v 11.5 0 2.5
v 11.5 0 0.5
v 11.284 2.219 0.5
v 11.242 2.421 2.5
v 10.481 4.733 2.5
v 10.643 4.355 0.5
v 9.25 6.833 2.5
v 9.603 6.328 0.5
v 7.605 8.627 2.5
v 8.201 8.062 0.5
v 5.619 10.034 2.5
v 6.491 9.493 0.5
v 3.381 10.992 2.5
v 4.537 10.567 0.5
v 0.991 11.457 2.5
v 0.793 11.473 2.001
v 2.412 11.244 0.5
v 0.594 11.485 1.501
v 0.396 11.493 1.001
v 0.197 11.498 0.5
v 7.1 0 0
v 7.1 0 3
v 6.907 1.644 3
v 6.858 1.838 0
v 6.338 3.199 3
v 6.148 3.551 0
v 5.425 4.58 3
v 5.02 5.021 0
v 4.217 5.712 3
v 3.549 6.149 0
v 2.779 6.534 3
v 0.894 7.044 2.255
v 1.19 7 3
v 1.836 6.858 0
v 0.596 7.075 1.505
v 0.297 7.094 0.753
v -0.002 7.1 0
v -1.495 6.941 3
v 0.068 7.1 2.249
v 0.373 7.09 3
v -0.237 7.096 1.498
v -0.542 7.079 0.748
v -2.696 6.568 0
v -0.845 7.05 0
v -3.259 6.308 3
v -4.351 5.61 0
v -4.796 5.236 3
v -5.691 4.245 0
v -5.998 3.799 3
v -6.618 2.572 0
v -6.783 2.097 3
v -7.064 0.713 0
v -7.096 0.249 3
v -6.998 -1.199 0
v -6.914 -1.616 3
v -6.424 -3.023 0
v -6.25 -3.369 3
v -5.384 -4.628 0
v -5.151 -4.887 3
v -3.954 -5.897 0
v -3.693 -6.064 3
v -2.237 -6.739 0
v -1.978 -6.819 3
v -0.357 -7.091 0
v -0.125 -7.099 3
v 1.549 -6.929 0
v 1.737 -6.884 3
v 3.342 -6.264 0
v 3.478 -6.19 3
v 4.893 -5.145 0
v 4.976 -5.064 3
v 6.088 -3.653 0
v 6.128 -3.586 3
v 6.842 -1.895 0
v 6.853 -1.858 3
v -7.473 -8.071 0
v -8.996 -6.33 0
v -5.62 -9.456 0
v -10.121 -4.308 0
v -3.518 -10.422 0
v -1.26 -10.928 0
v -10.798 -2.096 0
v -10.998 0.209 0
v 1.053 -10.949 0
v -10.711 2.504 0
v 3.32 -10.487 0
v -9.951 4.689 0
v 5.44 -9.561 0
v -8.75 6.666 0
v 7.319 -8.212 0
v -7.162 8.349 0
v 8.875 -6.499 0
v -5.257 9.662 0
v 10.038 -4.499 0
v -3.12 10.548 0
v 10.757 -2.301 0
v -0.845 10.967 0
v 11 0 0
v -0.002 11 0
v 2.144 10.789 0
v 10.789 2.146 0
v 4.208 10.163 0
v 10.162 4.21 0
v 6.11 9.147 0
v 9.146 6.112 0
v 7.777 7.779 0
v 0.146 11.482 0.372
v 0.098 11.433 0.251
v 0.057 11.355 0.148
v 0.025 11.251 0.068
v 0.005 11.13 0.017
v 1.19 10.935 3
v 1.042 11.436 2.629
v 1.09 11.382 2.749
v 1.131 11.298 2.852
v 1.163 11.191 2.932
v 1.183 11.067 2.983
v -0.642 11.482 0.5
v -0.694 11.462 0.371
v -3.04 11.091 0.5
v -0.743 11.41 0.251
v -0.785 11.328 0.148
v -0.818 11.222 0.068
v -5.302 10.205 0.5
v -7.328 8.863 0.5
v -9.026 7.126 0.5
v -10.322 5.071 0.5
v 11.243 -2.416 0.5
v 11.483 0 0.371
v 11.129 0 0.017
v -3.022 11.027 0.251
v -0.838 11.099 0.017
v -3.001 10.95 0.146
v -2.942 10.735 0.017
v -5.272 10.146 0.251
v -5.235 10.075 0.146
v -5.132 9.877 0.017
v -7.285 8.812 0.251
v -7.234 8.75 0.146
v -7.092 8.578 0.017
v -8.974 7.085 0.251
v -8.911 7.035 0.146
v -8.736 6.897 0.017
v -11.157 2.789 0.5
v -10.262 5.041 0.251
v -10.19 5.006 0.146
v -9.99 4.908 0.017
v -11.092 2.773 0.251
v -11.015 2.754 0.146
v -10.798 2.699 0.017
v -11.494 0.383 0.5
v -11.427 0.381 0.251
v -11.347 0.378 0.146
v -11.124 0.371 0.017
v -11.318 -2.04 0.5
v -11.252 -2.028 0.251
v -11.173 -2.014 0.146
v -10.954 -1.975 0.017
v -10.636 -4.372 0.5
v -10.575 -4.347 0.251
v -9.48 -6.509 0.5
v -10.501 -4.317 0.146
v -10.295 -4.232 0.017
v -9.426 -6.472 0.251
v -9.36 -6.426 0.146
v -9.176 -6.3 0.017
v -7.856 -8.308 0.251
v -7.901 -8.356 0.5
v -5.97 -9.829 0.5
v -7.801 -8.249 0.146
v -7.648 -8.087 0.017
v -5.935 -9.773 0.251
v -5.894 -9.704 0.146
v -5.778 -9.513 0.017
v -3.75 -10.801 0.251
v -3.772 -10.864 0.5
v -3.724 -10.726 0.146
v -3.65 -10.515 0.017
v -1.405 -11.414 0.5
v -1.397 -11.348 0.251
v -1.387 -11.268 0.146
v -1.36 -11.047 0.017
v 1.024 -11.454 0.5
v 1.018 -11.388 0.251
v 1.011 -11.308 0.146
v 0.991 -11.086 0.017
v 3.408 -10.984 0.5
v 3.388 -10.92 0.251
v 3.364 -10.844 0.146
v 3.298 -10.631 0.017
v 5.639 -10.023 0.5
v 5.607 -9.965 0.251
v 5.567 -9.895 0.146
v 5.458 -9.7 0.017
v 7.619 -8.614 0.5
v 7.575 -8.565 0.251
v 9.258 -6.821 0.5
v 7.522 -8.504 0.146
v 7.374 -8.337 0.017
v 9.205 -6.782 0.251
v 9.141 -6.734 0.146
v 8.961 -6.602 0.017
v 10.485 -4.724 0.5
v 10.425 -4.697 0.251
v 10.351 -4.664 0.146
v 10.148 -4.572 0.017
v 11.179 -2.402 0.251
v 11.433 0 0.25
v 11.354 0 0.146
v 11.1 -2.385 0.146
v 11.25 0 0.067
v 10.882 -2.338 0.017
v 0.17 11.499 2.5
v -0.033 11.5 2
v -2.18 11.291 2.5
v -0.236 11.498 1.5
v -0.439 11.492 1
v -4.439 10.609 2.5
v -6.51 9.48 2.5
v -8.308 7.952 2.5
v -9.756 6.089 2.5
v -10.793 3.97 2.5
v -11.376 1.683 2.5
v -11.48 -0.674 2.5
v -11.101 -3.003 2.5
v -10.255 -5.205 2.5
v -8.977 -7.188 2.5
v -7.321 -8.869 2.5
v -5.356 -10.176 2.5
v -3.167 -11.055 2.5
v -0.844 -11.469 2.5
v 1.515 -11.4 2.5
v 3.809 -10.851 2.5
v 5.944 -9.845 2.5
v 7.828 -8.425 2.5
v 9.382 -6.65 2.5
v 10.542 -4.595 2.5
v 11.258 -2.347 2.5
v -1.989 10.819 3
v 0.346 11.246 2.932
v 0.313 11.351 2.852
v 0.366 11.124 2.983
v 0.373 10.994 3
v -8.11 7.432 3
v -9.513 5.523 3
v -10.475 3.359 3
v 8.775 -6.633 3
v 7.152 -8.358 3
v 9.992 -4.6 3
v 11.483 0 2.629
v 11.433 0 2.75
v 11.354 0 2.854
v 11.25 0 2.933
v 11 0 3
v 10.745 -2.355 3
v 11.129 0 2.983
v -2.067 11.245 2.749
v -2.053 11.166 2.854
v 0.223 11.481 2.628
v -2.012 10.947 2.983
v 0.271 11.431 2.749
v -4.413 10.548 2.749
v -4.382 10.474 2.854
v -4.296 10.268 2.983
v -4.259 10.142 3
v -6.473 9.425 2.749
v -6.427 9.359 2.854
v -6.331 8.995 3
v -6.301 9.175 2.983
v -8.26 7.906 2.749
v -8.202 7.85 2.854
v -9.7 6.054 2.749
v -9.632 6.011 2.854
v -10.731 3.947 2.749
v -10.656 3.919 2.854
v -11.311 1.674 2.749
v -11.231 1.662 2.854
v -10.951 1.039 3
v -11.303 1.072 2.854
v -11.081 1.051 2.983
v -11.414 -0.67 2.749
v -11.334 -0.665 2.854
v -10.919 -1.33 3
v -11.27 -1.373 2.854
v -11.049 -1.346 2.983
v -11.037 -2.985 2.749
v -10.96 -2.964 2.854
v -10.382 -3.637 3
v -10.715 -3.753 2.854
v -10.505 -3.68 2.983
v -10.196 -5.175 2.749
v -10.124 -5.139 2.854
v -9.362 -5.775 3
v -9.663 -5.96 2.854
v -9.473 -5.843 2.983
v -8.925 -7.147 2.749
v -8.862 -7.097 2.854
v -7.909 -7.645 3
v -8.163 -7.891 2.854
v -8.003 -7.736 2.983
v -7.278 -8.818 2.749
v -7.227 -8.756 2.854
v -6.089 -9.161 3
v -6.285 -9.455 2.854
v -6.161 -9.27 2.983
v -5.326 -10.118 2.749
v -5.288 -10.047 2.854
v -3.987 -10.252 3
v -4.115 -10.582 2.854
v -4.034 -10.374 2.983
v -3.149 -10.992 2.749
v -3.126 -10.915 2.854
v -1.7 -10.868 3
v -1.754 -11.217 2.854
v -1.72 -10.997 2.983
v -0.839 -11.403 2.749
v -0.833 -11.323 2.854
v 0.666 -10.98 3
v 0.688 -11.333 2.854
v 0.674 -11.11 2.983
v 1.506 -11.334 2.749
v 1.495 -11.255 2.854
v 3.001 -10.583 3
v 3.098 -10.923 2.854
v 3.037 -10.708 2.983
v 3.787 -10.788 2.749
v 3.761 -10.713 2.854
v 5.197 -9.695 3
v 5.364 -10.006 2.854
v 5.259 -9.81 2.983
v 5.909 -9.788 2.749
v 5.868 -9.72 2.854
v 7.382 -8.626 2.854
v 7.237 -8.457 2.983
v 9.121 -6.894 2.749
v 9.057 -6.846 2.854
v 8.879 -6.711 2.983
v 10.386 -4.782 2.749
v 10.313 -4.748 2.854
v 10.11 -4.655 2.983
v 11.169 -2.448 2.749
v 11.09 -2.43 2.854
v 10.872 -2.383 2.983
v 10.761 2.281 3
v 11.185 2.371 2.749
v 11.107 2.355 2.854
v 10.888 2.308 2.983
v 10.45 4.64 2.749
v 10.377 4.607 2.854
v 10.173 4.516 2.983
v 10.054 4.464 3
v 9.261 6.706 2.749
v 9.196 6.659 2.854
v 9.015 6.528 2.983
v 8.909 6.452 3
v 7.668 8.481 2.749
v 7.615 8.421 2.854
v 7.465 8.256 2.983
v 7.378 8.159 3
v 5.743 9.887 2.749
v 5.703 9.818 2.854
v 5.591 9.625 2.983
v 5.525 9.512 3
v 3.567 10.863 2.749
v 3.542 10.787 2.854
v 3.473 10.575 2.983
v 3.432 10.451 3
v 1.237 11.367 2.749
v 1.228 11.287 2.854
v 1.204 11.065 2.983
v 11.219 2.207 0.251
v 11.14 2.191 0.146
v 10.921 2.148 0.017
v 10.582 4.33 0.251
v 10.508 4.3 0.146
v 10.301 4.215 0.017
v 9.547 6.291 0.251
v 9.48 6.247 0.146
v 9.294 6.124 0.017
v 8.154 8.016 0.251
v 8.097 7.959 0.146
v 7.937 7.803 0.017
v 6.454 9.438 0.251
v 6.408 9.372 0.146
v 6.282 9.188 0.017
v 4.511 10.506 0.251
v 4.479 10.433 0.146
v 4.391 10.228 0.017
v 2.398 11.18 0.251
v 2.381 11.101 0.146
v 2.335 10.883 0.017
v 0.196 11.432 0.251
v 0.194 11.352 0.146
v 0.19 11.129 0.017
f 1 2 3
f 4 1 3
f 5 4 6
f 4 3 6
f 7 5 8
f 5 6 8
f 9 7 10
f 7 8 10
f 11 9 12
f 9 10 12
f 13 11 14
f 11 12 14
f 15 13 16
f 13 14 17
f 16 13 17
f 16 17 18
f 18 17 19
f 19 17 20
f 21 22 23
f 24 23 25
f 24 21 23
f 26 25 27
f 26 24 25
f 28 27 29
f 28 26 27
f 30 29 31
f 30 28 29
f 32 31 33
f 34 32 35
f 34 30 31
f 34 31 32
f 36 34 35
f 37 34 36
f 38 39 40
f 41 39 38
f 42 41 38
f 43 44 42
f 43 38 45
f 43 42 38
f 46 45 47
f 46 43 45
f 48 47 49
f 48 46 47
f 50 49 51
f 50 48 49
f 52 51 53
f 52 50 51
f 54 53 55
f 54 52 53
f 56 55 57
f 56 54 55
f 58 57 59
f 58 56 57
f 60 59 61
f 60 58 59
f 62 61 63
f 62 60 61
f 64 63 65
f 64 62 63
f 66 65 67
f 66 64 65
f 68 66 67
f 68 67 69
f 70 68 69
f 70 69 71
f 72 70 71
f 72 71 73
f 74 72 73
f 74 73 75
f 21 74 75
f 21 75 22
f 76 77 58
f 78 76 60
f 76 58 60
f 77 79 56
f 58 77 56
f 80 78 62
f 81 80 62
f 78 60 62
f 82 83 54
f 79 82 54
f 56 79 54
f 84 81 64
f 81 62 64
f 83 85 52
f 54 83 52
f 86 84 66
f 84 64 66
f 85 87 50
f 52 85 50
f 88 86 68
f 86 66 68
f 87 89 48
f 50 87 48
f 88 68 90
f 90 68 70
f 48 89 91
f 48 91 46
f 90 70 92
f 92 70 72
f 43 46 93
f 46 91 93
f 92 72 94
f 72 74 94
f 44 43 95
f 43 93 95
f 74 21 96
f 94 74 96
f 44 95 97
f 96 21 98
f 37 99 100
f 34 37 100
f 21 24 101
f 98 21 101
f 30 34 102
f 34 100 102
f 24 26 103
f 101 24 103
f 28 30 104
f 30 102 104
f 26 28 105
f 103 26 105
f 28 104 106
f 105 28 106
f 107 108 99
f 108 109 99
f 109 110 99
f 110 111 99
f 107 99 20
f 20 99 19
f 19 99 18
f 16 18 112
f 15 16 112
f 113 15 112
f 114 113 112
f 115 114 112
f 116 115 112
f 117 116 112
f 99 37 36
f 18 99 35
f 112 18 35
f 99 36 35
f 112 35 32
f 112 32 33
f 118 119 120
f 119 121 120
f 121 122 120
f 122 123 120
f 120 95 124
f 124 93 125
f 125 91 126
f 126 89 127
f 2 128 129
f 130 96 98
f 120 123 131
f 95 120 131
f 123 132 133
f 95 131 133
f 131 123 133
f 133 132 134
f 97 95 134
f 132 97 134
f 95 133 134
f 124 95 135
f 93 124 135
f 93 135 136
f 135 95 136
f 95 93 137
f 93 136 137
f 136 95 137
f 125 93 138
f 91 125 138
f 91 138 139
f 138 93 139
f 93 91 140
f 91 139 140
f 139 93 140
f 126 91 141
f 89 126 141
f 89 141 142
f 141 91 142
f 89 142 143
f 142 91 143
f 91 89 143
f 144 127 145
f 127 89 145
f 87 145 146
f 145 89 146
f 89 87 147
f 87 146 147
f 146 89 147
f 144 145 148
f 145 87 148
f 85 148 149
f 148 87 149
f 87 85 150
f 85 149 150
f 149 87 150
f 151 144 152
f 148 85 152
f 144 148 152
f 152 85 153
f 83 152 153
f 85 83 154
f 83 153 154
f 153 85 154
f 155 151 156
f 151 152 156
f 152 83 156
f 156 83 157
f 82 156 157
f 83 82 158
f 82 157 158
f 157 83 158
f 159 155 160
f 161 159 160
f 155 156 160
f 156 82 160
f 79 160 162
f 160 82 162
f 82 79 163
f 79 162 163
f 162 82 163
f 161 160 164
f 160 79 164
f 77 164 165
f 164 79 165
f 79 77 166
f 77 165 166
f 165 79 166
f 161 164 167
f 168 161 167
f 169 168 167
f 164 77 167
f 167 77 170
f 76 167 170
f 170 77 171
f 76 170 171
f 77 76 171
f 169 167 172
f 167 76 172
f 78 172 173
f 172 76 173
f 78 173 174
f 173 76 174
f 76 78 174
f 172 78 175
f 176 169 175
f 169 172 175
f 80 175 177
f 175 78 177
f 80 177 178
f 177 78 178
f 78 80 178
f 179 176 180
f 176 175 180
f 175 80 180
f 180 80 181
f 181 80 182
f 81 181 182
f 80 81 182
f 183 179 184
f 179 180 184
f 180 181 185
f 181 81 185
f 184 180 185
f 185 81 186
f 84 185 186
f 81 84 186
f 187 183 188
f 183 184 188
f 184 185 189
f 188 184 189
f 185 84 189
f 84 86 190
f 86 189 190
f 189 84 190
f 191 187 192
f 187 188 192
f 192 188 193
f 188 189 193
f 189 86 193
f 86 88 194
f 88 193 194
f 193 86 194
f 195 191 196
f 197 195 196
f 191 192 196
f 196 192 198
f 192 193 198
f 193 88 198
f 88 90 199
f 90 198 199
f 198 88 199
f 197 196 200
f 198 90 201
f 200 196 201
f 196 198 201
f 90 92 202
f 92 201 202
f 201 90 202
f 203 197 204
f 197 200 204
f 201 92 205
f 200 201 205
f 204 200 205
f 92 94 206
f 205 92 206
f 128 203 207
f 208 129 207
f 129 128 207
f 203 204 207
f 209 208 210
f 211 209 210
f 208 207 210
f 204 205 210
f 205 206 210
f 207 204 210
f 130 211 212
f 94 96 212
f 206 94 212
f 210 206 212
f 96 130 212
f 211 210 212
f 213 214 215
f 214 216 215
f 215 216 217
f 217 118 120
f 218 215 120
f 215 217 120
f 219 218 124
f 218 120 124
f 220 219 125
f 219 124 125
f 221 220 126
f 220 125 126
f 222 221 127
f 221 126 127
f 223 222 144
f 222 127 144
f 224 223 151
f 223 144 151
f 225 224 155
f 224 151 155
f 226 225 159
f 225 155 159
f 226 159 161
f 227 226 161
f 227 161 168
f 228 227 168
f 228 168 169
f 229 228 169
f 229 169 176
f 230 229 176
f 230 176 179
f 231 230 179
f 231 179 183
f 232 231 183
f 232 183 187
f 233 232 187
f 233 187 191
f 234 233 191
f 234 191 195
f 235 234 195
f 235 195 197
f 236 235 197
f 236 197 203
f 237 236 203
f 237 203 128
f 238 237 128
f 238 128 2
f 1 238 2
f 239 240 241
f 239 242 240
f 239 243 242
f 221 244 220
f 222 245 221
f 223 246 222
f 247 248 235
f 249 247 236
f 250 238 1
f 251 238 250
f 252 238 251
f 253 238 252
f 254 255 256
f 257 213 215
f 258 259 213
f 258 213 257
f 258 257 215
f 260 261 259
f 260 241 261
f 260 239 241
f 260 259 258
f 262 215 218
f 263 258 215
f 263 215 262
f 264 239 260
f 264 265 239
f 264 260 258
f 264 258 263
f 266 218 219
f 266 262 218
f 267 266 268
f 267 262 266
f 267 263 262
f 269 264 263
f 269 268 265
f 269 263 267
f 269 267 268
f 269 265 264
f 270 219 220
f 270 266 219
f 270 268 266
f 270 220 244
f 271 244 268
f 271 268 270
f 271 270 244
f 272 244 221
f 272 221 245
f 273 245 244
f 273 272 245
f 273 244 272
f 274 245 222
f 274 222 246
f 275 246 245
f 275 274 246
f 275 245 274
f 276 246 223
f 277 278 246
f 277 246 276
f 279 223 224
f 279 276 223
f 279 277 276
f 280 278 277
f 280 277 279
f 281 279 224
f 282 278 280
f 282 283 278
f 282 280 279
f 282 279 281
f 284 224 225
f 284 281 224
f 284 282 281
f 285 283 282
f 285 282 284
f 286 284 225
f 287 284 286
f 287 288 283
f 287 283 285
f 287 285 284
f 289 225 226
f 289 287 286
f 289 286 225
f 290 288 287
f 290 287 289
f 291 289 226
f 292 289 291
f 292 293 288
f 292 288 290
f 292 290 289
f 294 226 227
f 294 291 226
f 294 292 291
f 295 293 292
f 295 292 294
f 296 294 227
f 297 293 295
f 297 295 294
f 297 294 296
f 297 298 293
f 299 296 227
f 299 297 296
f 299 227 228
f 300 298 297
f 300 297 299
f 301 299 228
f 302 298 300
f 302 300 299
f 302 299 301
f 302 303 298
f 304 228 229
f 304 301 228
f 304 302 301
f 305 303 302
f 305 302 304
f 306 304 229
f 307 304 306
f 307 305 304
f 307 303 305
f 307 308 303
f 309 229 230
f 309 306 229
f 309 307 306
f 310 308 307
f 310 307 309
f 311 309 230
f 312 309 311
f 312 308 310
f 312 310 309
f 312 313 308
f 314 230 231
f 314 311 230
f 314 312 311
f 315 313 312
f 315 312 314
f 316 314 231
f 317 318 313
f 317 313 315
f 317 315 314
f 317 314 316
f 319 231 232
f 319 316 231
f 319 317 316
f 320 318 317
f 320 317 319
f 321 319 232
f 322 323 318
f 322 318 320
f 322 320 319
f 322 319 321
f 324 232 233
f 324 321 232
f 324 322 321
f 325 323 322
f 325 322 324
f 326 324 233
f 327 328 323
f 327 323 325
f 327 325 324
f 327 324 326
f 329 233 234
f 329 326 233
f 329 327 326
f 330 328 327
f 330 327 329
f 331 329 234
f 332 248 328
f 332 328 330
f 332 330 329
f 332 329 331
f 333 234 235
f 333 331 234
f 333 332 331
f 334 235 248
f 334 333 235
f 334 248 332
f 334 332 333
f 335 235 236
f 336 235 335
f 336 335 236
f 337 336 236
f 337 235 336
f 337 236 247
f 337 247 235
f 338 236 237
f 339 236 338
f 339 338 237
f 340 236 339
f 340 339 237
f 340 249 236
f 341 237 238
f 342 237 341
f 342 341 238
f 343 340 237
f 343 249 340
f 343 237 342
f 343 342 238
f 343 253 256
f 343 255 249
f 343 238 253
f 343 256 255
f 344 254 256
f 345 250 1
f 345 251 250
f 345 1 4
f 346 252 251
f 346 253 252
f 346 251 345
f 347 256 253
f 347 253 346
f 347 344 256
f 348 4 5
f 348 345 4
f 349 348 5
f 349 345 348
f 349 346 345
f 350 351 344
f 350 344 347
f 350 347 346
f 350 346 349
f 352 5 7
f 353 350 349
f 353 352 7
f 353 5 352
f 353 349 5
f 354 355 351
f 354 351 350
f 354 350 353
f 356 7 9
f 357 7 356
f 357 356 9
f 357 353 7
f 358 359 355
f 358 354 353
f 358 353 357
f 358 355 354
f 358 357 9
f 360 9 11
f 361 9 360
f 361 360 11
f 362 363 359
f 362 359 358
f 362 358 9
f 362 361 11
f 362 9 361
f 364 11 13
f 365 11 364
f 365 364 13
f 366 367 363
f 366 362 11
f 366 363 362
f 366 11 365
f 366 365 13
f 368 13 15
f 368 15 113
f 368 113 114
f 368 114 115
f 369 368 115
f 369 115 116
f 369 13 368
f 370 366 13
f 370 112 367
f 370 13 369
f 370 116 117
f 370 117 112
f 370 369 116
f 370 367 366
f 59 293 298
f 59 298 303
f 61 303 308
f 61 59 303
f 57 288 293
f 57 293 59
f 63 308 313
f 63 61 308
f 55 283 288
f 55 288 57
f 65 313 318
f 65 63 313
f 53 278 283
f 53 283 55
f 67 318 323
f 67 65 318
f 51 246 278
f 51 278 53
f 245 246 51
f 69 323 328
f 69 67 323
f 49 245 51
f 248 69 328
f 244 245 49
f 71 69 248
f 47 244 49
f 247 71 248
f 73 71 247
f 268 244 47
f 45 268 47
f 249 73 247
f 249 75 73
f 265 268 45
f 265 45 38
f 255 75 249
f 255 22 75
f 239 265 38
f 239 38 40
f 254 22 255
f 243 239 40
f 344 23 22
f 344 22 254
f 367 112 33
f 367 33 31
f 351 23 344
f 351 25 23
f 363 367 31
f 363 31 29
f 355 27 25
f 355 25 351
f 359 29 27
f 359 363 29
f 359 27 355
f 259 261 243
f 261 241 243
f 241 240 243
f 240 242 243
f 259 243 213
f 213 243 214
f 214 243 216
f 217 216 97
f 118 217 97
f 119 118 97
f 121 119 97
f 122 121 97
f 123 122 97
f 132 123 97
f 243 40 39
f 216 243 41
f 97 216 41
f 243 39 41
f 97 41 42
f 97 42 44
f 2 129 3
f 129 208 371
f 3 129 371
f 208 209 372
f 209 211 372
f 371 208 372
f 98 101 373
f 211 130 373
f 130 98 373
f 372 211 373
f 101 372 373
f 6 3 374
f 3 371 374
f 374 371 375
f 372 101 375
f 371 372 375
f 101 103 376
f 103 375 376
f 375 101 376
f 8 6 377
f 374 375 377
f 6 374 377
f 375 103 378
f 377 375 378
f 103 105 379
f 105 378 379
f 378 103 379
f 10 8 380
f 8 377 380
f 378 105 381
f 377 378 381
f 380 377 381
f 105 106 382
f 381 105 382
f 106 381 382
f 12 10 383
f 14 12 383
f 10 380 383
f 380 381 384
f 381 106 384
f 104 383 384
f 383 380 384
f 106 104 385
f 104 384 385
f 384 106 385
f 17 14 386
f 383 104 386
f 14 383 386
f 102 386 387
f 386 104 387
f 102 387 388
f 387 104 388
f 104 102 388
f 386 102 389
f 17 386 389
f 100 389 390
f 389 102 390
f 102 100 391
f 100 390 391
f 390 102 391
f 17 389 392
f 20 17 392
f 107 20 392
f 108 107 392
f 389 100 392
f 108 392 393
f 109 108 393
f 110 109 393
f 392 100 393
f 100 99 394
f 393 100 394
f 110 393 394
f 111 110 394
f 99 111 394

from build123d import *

# Parameters (mm, degrees)
ESQUISSE1_R             = 11.5
ESQUISSE1_R_2           = 7.1
EXTRUSION1_DEPTH        = 3
CONG_2_R                = 0.5
ENL_V_MAT_EXTRU_1_DEPTH = 12.5000001


with BuildPart() as part:
    # Esquisse1 → Extrusion1 (new body)
    with BuildSketch(Plane.XY):
        Circle(ESQUISSE1_R)
        Circle(ESQUISSE1_R_2, mode=Mode.SUBTRACT)
    extrude(amount=EXTRUSION1_DEPTH)

    # Congé2
    cong_2_edges = [part.edges().sort_by_distance(p)[0] for p in [
        (-11.5, 0, 0),
        (-11.5, 0, 3),
    ]]
    fillet(cong_2_edges, radius=CONG_2_R)

    # Esquisse2 → Enlèv. mat.-Extru.1 (cut, through all)
    with BuildSketch(Plane(origin=(0, 0, 0), x_dir=(1, 0, 0), z_dir=(0, 1, 0))):
        Polygon((-0.862634787, 2.166197843), (1.536568214, -3.872245663), (0.727848101, -3.872245663), (-1.725269573, 2.166197843), align=None)
    extrude(amount=ENL_V_MAT_EXTRU_1_DEPTH, mode=Mode.SUBTRACT)


solid = part.part
